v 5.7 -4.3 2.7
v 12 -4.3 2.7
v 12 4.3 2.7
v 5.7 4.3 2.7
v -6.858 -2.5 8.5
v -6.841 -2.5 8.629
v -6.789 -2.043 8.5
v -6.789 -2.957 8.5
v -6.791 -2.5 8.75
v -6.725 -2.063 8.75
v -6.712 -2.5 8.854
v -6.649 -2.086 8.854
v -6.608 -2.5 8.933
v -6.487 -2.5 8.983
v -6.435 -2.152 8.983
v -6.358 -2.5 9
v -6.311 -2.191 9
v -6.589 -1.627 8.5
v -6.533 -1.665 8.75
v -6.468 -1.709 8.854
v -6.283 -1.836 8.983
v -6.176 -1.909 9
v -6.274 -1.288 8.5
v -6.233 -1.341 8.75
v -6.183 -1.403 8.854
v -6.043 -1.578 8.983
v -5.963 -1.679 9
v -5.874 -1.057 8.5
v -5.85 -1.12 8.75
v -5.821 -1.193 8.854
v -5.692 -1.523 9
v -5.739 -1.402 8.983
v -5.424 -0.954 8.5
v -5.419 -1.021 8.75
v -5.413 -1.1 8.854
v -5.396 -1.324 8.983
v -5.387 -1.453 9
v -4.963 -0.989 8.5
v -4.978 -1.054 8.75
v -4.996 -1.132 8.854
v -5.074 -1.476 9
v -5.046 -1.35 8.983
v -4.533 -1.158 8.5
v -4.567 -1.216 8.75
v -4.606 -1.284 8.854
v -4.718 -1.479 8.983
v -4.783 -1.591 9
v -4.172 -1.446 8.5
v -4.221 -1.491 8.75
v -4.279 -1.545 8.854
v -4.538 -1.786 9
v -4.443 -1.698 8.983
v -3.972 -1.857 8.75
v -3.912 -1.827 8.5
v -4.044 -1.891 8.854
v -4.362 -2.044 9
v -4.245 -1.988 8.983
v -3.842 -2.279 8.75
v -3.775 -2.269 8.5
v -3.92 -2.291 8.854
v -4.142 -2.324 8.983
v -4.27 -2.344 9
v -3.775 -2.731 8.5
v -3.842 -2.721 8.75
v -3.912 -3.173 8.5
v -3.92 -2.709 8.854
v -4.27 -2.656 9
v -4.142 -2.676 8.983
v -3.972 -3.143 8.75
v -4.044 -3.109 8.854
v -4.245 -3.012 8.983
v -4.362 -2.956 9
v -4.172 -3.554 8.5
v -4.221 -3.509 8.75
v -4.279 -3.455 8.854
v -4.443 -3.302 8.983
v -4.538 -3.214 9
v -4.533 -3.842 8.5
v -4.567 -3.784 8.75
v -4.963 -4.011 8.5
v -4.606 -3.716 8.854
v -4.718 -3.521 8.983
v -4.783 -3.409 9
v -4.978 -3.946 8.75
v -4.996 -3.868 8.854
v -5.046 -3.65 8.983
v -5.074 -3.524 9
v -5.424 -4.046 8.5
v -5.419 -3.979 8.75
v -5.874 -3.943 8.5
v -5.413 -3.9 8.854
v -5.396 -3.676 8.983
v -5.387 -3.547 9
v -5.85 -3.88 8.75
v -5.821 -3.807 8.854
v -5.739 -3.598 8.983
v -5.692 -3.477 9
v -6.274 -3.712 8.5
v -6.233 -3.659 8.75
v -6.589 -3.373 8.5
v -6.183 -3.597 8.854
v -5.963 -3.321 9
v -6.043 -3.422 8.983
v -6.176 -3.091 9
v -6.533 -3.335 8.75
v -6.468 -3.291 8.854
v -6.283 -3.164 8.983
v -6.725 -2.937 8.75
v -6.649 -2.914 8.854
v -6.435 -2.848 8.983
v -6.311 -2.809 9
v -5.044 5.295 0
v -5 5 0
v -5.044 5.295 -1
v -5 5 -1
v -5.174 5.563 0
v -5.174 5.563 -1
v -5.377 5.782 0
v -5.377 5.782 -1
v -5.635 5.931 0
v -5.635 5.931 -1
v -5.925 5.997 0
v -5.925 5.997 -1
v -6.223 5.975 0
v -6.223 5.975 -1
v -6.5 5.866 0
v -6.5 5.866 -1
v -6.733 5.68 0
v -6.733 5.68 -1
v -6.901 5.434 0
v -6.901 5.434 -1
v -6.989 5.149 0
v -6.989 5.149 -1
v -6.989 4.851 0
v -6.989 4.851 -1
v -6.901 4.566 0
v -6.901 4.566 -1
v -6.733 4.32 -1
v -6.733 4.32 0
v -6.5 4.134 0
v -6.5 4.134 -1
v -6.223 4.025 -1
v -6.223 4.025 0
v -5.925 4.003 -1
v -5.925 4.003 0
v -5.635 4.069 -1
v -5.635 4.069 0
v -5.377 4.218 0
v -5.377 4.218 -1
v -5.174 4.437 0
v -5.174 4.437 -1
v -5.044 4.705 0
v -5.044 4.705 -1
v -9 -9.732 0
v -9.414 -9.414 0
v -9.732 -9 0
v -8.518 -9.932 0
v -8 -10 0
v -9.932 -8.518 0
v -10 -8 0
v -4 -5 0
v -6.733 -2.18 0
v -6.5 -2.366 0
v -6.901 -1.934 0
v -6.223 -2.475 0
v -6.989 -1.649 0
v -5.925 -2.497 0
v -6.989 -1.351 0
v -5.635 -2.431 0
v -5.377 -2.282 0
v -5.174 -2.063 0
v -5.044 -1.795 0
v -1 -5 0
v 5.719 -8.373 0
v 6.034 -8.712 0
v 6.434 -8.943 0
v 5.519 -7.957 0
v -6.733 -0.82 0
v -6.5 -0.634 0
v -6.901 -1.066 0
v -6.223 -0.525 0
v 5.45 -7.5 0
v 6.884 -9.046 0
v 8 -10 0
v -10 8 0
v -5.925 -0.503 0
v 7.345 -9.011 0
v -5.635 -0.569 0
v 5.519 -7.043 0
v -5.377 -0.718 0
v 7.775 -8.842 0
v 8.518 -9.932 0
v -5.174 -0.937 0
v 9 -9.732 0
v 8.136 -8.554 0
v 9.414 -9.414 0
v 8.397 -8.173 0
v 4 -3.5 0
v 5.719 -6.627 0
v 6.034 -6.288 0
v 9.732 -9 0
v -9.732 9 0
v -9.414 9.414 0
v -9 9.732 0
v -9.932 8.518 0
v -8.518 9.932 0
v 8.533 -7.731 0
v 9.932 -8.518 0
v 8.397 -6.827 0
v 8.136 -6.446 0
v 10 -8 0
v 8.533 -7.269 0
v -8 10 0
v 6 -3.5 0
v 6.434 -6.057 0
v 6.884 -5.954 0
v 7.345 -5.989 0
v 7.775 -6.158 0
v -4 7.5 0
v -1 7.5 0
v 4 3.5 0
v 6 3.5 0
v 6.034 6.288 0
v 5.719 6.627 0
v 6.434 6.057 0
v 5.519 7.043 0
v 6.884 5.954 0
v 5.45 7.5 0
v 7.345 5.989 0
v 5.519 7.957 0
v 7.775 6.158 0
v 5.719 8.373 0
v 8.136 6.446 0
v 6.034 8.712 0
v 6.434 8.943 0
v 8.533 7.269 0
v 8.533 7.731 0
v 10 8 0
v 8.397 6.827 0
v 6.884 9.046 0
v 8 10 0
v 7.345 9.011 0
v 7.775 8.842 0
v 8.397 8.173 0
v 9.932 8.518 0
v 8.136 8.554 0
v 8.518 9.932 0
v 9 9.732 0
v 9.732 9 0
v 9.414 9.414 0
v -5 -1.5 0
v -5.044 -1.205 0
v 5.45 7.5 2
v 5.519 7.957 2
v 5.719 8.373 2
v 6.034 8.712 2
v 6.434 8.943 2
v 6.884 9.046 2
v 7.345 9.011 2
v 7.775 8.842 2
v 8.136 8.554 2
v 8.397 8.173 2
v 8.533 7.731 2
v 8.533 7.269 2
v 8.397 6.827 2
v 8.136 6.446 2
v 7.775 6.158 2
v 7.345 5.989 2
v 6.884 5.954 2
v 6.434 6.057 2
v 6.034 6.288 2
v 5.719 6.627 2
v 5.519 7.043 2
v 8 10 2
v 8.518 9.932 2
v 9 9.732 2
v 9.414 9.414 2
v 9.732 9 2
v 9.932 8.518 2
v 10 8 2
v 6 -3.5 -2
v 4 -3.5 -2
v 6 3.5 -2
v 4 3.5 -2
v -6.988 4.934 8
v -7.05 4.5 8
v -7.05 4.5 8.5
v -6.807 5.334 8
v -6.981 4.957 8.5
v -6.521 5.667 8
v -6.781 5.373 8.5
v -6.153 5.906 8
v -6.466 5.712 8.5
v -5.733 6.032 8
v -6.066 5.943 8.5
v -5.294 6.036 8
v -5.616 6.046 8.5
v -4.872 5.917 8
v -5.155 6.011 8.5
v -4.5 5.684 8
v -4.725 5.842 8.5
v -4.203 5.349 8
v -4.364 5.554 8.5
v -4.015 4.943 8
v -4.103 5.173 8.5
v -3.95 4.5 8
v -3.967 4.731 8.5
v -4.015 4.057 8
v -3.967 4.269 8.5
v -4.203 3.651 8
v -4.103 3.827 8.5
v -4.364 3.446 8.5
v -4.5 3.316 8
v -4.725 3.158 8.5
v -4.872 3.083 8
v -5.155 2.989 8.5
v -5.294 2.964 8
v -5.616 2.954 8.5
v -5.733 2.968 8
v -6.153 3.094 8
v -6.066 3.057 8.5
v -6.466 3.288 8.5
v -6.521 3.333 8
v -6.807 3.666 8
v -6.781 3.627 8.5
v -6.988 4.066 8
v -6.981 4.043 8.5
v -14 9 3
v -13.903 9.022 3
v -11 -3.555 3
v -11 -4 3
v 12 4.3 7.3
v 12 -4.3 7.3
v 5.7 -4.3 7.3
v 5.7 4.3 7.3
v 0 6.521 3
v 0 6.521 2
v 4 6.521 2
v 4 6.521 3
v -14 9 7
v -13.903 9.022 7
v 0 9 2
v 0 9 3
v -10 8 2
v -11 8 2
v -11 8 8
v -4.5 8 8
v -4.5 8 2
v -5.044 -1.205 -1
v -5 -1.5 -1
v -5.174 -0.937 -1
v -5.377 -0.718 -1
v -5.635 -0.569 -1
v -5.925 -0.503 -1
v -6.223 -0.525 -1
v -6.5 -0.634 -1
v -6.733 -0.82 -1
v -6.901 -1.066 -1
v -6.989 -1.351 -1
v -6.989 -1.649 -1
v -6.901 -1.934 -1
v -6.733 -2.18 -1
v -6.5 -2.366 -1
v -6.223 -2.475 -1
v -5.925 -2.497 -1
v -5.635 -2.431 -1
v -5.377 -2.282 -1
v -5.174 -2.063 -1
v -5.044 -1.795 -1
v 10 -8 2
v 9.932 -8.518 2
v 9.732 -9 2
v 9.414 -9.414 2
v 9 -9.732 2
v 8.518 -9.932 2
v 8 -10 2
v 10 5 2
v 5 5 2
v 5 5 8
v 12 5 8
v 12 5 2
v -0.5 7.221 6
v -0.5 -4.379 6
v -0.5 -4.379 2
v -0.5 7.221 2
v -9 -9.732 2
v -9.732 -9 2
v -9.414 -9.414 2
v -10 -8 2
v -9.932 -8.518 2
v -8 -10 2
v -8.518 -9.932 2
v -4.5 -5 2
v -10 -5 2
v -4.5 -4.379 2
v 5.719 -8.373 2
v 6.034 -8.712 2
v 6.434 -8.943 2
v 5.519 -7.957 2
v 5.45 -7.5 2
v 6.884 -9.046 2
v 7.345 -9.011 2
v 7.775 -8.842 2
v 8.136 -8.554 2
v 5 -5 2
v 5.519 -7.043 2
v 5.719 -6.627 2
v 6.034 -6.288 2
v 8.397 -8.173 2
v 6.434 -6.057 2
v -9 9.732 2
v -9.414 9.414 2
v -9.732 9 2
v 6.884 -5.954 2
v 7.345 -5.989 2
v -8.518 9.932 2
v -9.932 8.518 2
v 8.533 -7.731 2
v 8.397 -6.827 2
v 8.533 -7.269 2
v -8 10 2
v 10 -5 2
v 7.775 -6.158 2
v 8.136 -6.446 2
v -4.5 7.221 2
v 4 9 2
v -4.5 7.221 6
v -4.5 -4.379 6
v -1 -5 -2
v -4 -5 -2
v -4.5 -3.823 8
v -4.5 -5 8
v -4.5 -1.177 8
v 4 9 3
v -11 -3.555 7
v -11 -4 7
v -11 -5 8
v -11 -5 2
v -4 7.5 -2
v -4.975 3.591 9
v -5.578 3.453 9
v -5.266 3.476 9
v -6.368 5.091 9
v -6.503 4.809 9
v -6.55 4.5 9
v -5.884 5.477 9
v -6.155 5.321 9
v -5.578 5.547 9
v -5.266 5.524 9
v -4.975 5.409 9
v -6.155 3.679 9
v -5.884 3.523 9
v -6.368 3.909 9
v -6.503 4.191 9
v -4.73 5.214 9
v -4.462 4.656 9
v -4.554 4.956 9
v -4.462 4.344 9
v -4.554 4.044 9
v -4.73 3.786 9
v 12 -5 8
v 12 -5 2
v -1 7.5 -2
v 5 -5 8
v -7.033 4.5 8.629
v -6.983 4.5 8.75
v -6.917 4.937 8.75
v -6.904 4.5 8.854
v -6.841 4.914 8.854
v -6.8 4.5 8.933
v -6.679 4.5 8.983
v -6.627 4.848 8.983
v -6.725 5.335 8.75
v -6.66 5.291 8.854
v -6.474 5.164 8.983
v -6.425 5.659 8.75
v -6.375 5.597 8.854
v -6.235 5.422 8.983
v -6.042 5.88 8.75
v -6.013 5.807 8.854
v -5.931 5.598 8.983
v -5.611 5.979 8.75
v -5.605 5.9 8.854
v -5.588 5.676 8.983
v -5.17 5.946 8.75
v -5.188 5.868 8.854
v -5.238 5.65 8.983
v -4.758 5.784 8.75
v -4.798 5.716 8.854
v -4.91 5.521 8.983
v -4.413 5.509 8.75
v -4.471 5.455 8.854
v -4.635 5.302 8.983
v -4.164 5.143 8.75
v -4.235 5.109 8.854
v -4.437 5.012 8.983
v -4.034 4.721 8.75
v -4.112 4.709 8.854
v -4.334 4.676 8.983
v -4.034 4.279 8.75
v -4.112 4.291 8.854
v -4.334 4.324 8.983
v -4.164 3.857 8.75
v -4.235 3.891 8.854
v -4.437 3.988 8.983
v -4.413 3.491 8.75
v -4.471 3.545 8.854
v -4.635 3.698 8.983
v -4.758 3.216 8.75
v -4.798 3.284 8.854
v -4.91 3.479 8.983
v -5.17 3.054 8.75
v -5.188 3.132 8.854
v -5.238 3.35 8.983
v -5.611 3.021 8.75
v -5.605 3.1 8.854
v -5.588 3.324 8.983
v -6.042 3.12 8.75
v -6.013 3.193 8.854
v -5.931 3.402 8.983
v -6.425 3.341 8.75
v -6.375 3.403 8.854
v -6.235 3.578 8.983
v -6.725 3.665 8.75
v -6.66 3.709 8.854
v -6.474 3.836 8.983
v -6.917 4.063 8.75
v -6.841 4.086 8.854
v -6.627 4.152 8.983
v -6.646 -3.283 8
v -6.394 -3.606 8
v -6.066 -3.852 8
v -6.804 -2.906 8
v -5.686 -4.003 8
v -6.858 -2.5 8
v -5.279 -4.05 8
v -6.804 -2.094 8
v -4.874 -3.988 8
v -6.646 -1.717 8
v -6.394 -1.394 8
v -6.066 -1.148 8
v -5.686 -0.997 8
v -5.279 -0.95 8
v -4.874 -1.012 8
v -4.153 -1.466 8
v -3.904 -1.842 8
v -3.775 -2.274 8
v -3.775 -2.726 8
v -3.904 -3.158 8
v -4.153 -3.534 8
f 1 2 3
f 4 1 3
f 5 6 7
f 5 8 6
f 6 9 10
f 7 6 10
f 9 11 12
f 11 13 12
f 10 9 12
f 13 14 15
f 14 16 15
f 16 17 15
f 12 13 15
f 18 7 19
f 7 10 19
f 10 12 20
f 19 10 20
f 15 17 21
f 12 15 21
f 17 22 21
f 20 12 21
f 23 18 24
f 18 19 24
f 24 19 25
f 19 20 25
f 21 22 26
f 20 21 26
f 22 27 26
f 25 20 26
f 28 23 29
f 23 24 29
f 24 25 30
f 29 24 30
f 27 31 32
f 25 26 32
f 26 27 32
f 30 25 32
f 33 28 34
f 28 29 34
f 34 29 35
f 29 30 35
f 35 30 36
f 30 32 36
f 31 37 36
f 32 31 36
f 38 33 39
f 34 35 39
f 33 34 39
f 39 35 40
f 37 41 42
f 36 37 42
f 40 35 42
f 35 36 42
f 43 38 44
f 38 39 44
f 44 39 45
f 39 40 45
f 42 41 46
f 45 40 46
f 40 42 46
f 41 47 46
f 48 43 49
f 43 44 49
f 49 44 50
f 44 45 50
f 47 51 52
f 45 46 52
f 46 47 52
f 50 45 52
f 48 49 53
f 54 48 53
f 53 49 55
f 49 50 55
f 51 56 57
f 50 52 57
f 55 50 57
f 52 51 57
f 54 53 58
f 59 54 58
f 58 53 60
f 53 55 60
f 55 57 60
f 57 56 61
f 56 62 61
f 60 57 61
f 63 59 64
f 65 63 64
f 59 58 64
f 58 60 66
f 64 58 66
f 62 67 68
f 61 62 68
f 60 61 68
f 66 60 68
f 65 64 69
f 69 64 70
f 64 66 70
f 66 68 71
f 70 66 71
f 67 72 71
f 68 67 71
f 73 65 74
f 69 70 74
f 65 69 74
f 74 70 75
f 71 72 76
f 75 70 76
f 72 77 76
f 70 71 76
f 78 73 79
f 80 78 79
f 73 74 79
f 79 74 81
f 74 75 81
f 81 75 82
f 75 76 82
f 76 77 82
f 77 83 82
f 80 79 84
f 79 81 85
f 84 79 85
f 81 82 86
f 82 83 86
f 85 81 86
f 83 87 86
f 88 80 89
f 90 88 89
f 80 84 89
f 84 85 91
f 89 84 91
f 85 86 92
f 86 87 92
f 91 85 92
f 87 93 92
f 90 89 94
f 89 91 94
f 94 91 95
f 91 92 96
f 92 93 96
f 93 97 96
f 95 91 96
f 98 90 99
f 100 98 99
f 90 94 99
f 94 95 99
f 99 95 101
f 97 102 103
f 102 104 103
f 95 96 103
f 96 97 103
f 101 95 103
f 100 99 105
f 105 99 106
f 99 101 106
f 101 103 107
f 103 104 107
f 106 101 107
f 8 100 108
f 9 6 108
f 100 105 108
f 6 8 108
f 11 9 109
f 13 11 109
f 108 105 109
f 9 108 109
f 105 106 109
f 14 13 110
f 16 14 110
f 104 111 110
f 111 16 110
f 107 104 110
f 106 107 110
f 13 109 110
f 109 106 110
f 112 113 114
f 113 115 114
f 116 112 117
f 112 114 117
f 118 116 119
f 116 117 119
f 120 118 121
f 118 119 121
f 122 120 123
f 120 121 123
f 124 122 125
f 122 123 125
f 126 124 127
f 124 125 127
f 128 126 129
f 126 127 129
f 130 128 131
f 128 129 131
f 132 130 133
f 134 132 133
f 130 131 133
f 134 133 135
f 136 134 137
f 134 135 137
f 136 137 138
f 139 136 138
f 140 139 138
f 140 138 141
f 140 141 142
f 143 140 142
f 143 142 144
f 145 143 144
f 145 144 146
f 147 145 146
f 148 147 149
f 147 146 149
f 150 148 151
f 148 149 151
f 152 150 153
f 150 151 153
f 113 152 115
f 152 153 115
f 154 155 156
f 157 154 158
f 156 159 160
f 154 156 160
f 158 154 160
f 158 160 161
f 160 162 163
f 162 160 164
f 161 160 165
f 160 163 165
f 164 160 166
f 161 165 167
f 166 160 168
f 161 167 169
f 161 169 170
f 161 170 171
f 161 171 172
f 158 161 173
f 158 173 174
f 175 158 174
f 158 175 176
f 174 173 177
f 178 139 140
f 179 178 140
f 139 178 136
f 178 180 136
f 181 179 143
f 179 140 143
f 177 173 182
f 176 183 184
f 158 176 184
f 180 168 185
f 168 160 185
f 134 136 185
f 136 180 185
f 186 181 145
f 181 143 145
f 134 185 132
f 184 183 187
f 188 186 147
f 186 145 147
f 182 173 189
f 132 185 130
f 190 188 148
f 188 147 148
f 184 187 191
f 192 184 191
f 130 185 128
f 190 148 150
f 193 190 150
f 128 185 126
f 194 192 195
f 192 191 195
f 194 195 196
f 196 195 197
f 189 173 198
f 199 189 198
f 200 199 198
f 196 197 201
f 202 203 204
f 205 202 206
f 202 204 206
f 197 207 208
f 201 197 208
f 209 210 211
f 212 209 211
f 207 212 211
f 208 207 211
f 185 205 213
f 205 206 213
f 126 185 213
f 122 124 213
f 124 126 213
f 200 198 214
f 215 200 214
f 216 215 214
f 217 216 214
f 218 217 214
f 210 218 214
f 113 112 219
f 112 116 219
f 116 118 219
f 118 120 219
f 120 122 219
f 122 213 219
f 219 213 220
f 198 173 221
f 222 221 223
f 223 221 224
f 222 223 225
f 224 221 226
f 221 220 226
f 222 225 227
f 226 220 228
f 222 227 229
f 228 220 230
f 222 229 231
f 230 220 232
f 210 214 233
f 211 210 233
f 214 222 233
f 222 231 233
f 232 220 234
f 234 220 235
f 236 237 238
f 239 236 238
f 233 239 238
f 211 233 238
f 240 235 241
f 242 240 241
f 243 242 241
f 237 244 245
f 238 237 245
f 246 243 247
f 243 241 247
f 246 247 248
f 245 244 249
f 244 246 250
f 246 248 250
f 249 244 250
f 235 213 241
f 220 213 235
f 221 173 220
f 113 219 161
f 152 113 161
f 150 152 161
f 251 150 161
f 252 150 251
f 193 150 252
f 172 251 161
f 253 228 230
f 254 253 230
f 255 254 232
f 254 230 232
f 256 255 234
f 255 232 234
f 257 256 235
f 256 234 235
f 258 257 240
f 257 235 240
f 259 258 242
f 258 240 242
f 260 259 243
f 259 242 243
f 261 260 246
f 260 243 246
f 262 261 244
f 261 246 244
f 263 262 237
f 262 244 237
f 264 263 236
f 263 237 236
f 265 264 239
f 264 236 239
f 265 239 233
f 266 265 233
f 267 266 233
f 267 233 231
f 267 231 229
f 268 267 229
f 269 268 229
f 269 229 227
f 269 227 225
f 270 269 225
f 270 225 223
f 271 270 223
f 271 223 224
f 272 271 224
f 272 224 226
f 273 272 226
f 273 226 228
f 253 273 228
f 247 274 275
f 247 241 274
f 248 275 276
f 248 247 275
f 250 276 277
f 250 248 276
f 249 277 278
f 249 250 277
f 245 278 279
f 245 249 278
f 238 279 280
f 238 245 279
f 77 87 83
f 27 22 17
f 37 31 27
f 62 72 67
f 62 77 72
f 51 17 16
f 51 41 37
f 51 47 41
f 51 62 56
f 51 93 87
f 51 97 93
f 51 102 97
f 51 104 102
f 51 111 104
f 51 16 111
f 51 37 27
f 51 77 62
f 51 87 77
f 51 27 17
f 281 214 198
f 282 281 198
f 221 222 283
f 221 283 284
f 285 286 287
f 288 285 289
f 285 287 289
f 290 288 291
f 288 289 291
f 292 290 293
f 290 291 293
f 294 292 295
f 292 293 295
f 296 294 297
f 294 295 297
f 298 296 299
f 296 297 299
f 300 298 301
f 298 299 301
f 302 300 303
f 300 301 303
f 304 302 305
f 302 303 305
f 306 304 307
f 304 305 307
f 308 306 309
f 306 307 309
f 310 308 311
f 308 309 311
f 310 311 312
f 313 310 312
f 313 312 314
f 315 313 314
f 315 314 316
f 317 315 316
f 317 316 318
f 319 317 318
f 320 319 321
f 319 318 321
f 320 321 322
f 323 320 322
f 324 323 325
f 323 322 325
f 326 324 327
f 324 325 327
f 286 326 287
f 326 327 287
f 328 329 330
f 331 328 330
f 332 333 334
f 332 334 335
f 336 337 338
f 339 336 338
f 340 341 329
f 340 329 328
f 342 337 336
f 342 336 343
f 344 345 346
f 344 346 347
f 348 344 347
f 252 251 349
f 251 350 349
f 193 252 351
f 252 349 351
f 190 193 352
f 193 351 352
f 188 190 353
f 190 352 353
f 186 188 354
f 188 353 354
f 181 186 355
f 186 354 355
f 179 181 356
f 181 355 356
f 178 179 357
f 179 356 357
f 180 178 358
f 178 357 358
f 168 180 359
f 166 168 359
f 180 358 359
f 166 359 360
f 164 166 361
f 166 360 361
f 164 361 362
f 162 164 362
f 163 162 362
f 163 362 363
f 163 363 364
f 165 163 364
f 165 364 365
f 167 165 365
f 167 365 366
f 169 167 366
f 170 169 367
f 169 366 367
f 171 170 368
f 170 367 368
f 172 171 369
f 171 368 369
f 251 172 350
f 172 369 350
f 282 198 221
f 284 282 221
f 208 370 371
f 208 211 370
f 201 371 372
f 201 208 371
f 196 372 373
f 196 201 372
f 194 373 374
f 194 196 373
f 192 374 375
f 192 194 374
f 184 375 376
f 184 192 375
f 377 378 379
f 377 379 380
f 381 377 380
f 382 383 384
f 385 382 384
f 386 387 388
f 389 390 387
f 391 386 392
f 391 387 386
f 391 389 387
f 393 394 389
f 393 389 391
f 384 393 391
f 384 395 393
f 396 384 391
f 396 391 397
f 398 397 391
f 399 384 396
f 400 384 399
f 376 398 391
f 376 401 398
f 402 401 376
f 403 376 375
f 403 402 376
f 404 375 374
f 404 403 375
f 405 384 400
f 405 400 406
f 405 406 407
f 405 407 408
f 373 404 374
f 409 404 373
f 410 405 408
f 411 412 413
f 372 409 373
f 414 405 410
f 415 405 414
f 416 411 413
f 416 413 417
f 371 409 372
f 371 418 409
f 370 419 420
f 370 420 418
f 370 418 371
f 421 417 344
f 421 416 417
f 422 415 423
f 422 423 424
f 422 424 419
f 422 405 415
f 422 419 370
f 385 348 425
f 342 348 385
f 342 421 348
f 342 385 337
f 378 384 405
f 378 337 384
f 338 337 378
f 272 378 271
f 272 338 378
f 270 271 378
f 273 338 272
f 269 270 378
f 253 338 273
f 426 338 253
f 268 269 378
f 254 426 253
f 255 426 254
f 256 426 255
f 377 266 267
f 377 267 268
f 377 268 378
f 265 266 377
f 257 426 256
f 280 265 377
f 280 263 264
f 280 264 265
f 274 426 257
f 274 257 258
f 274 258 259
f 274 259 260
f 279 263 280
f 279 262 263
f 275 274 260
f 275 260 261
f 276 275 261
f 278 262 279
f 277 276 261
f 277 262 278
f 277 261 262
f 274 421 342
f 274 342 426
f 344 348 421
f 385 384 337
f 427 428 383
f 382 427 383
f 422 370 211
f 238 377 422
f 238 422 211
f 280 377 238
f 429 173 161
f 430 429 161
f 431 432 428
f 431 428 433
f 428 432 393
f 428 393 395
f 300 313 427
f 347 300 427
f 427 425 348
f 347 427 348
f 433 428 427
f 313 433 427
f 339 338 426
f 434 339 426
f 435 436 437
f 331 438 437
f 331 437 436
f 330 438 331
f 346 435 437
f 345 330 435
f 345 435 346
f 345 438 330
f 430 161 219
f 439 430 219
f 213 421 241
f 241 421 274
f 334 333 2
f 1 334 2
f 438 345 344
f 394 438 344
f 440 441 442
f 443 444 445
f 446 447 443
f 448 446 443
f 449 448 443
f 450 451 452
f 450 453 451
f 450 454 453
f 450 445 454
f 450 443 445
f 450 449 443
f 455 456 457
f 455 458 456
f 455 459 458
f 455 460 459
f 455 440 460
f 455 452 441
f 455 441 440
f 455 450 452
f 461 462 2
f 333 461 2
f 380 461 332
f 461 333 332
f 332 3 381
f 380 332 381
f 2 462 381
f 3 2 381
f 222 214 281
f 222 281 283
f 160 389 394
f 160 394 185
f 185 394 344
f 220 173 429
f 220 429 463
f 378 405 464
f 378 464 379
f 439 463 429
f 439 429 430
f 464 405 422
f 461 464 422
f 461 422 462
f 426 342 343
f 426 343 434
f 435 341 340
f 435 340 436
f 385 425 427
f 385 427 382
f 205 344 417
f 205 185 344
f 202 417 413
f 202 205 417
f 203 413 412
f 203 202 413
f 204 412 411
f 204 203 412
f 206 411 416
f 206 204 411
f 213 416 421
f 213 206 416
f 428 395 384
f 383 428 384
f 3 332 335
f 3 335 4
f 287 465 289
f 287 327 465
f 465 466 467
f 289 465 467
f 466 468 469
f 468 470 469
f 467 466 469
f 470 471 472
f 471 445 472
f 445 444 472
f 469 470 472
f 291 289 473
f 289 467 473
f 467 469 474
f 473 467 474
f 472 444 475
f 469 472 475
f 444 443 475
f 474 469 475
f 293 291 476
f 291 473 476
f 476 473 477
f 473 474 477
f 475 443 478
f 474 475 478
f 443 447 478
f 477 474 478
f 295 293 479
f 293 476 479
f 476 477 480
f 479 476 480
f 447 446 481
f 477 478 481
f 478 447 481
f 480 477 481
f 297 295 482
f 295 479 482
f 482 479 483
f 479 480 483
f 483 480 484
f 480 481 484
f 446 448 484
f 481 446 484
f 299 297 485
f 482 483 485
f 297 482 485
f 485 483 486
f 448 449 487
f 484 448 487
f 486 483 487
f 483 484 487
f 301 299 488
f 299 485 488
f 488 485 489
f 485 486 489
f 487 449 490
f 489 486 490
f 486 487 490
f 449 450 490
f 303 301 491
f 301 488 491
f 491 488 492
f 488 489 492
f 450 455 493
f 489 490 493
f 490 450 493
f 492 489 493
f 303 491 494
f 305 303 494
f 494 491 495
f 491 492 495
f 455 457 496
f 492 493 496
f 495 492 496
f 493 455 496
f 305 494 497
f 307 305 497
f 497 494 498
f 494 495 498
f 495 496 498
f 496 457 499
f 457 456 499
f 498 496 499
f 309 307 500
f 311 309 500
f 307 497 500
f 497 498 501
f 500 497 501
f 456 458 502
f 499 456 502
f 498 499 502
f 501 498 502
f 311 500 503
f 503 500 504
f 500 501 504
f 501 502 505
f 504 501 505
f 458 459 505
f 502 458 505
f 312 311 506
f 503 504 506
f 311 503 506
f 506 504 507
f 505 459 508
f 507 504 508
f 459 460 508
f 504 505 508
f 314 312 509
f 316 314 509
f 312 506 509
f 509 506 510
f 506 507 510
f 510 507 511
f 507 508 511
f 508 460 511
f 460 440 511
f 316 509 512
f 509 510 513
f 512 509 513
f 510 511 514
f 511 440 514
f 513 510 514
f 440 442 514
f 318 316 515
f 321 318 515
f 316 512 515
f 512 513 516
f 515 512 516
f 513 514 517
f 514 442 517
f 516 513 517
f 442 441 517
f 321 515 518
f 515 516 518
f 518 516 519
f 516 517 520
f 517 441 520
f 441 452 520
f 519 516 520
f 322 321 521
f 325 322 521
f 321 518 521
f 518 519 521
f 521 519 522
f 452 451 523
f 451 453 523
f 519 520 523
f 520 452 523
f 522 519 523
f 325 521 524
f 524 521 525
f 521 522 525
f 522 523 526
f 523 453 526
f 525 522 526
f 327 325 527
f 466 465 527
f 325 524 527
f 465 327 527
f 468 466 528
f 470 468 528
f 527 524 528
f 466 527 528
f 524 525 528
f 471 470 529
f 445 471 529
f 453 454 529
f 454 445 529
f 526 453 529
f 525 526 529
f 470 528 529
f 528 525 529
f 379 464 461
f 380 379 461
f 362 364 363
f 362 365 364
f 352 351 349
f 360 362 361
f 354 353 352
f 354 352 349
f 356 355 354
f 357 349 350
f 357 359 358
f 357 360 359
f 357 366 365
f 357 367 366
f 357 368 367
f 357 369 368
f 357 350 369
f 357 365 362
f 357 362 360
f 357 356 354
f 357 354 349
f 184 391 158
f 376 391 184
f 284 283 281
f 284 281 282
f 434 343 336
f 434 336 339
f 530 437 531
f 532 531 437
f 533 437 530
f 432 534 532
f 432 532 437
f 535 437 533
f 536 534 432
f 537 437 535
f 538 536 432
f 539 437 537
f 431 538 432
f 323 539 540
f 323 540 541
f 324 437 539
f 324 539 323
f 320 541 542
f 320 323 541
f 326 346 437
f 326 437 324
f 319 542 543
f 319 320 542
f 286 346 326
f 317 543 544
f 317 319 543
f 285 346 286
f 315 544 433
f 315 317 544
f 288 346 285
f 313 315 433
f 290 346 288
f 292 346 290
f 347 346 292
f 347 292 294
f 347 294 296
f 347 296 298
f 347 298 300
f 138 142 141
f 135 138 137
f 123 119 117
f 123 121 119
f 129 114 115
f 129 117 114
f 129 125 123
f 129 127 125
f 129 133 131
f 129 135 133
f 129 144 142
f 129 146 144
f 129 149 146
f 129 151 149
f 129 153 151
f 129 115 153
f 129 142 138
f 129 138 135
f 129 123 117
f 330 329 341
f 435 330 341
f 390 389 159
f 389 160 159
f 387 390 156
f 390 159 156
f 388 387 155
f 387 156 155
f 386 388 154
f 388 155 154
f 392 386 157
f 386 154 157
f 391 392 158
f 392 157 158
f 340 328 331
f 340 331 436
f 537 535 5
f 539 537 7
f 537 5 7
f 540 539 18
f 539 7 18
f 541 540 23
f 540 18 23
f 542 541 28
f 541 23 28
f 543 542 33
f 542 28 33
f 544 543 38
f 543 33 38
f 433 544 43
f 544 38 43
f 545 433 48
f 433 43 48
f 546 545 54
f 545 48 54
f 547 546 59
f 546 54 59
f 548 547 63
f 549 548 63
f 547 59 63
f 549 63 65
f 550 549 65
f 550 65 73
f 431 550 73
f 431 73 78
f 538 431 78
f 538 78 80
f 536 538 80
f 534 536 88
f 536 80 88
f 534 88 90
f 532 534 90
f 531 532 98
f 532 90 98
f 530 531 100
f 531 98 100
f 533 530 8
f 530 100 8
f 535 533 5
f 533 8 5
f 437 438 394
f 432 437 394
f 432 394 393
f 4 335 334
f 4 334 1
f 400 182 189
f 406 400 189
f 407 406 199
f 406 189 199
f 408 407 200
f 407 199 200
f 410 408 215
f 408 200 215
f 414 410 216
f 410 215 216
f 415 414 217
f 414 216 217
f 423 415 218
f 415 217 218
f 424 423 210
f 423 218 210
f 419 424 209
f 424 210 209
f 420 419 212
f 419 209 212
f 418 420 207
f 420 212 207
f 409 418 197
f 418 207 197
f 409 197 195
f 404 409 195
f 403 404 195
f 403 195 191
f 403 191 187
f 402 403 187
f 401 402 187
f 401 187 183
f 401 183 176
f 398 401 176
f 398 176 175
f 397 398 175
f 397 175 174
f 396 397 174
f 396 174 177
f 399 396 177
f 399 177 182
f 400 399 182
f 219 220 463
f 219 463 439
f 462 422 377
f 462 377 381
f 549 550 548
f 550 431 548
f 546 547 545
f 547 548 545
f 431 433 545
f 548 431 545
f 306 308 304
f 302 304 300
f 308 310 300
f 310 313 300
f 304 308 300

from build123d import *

# Parameters (mm, degrees)
SKETCH1_W                  = 20
SKETCH1_H                  = 20
BOSS_EXTRUDE1_DEPTH        = 2
SKETCH2_W                  = 7
SKETCH2_H                  = 10
BOSS_EXTRUDE2_DEPTH        = 6
SKETCH3_W                  = 6.5
SKETCH3_H                  = 13
BOSS_EXTRUDE3_DEPTH        = 6
BOSS_EXTRUDE4_REACH        = 29.324
SKETCH4_W                  = 0.1
SKETCH4_H                  = 4
SKETCH5_W                  = 4
SKETCH5_H                  = 2.479052782
BOSS_EXTRUDE5_DEPTH        = 1
SKETCH6_W                  = 3
SKETCH6_H                  = 12.5
BOSS_EXTRUDE6_DEPTH        = 2
SKETCH7_W                  = 2
SKETCH7_H                  = 7
BOSS_EXTRUDE7_DEPTH        = 2
SKETCH8_W                  = 4.6
SKETCH8_H                  = 8.6
CUT_EXTRUDE1_DEPTH         = 6.3
SKETCH9_W                  = 1
SKETCH9_H                  = 1
SKETCH10_W                 = 1
SKETCH10_H                 = 1
SKETCH11_W                 = 1.55
SKETCH11_H                 = 1
SKETCH12_W                 = 1.55
SKETCH12_H                 = 1
F_3_1_3_1_DIAMETER_HOLE1_D = 3.1
RIB1_START                 = -5.8
RIB1_OUTLINE_W             = 4
RIB1_OUTLINE_H             = 4
RIB1_DEPTH                 = 11.6
FILLET1_R                  = 0.5
FILLET2_R                  = 2


# Read off the part's stored shape, not the designer's step: Rib1
with BuildPart() as part:
    # Sketch1 → Boss-Extrude1 (new body)
    with BuildSketch(Plane.XY.offset(2)):
        Rectangle(SKETCH1_W, SKETCH1_H)
    extrude(amount=-BOSS_EXTRUDE1_DEPTH)

    # Sketch2 → Boss-Extrude2 (add)
    with BuildSketch(Plane.XY.offset(2)):
        with Locations((8.5, 0)):
            Rectangle(SKETCH2_W, SKETCH2_H)
    extrude(amount=BOSS_EXTRUDE2_DEPTH)

    # Sketch3 → Boss-Extrude3 (add)
    with BuildSketch(Plane.XY.offset(2)):
        with Locations((-7.75, 1.5)):
            Rectangle(SKETCH3_W, SKETCH3_H)
    extrude(amount=BOSS_EXTRUDE3_DEPTH)

    # Boss-Extrude4: up to this plane
    boss_extrude4_end = Plane(origin=(-11, -5, 8), z_dir=(1, 0, 0))
    # Sketch4 → Boss-Extrude4 (add, up to the surface)
    with BuildSketch(Plane(origin=(-2.679775281, 11.612359551, 0), x_dir=(-0.9743911956946198, -0.22485950669875843, 0), z_dir=(-0.22485950669875843, 0.9743911956946198, 0)), mode=Mode.PRIVATE) as boss_extrude4_sk1:
        with Locations((11.567741179, 5)):
            Rectangle(SKETCH4_W, SKETCH4_H)
    boss_extrude4_tool1 = split(extrude(boss_extrude4_sk1.sketch, amount=-BOSS_EXTRUDE4_REACH, mode=Mode.PRIVATE), bisect_by=boss_extrude4_end, keep=Keep.BOTH, mode=Mode.PRIVATE)
    add(boss_extrude4_tool1.solids().sort_by_distance((-13.95128, 9.011243, 5))[0])

    # Sketch5 → Boss-Extrude5 (add)
    with BuildSketch(Plane.XY.offset(2)):
        with Locations((2, 7.760473609)):
            Rectangle(SKETCH5_W, SKETCH5_H)
    extrude(amount=BOSS_EXTRUDE5_DEPTH)

    # Sketch6 → Boss-Extrude6 (add)
    with BuildSketch(Plane(origin=(0, 0, 0), x_dir=(-1, 0, 0), z_dir=(0, 0, -1))):
        with Locations((2.5, 1.25)):
            Rectangle(SKETCH6_W, SKETCH6_H)
    extrude(amount=BOSS_EXTRUDE6_DEPTH)

    # Sketch7 → Boss-Extrude7 (add)
    with BuildSketch(Plane(origin=(0, 0, 0), x_dir=(-1, 0, 0), z_dir=(0, 0, -1))):
        with Locations((-5, 0)):
            Rectangle(SKETCH7_W, SKETCH7_H)
    extrude(amount=BOSS_EXTRUDE7_DEPTH)

    # Sketch8 → Cut-Extrude1 (cut)
    with BuildSketch(Plane(origin=(12, 0, 0), x_dir=(0, 0, -1), z_dir=(1, 0, 0))):
        with Locations((-5, 0)):
            Rectangle(SKETCH8_W, SKETCH8_H)
    extrude(amount=-CUT_EXTRUDE1_DEPTH, mode=Mode.SUBTRACT)

    # Sketch9 → Revolve1 (revolve)
    with BuildSketch(Plane(origin=(0, -1.5, 0), x_dir=(1, 0, 0), z_dir=(0, 1, 0))):
        with Locations((-5.5, 0.5)):
            Rectangle(SKETCH9_W, SKETCH9_H)
    revolve(axis=Axis((-6, -1.5, -1), (0, 0, 1)))

    # Sketch10 → Revolve2 (revolve)
    with BuildSketch(Plane(origin=(0, 5, 0), x_dir=(1, 0, 0), z_dir=(0, 1, 0))):
        with Locations((-5.5, 0.5)):
            Rectangle(SKETCH10_W, SKETCH10_H)
    revolve(axis=Axis((-6, 5, -1), (0, 0, 1)))

    # Sketch11 → Revolve3 (revolve)
    with BuildSketch(Plane.XZ.offset(-4.5), mode=Mode.PRIVATE) as revolve3_sk:
        with Locations((-4.725, 8.5)):
            Rectangle(SKETCH11_W, SKETCH11_H)
    revolve(revolve3_sk.sketch.rotate(Axis((-5.5, 4.5, 9), (0, 0, -1)), 180), axis=Axis((-5.5, 4.5, 9), (0, 0, -1)))

    # Sketch12 → Revolve4 (revolve)
    with BuildSketch(Plane.XZ.offset(2.5), mode=Mode.PRIVATE) as revolve4_sk:
        with Locations((-4.533061125, 8.5)):
            Rectangle(SKETCH12_W, SKETCH12_H)
    revolve(revolve4_sk.sketch.rotate(Axis((-5.308061125, -2.5, 9), (0, 0, -1)), 180), axis=Axis((-5.308061125, -2.5, 9), (0, 0, -1)))

    # Ø3.1 (3.1) Diameter Hole1 (through all)
    with Locations(Plane.XY.offset(2)):
        with Locations((7, -7.5), (7, 7.5)):
            Hole(F_3_1_3_1_DIAMETER_HOLE1_D / 2)

    # Rib1 outline → Rib1 (add)
    with BuildSketch(Plane(origin=(0, 1.420947218, 0), x_dir=(1, 0, 0), z_dir=(0, 1, 0)).offset(RIB1_START)):
        with Locations((-2.5, -4)):
            Rectangle(RIB1_OUTLINE_W, RIB1_OUTLINE_H)
    extrude(amount=RIB1_DEPTH)

    # Fillet1
    fillet1_edges = [part.edges().sort_by_distance(p)[0] for p in [
        (-3.95, 4.5, 9),
        (-3.758061125, -2.5, 9),
    ]]
    fillet(fillet1_edges, radius=FILLET1_R)

    # Fillet2
    fillet2_edges = [part.edges().sort_by_distance(p)[0] for p in [
        (10, 10, 1),
        (10, -10, 1),
        (-10, -10, 1),
        (-10, 10, 1),
    ]]
    fillet(fillet2_edges, radius=FILLET2_R)


solid = part.part
